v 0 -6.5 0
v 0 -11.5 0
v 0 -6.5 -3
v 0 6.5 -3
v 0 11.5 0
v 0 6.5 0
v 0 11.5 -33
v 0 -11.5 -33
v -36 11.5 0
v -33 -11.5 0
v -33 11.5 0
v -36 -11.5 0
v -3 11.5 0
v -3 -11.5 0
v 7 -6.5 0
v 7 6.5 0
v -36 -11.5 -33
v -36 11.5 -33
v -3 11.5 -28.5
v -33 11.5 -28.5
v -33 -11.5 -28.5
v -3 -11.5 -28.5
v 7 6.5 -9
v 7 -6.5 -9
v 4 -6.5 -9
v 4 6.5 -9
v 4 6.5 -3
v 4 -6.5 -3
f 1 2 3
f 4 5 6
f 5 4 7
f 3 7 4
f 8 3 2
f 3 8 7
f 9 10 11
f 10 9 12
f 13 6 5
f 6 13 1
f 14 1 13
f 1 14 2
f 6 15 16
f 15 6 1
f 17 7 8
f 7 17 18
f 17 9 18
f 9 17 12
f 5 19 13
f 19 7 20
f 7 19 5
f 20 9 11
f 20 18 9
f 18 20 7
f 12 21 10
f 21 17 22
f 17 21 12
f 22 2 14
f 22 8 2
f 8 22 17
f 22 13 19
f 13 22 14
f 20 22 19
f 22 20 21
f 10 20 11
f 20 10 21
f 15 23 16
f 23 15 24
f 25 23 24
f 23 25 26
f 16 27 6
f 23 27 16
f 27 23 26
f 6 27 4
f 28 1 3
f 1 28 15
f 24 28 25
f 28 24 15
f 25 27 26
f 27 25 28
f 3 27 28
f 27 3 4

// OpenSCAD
width = 20;
high = 30;
depth = 30;
thin = 3;
clearance = 1;
hole = width - (thin*2+clearance);

translate([-(depth+thin*2)/2, 0, -(high+thin)/2])
{
    difference()
    {
        cube([depth+thin*2, width+thin, high+thin], true);
        translate([0, 0, thin])
        {
            cube([depth, width+thin, high], true);
        }
    }
}

translate([(thin*2+clearance)/2, 0, -thin*3/2])
{
    difference()
    {
        cube([thin*2+clearance, hole, thin*3], true);
        translate([-thin/2, 0, -thin/2])
        {
           cube([thin+clearance, hole, thin*2], true);
        }
    }
}
